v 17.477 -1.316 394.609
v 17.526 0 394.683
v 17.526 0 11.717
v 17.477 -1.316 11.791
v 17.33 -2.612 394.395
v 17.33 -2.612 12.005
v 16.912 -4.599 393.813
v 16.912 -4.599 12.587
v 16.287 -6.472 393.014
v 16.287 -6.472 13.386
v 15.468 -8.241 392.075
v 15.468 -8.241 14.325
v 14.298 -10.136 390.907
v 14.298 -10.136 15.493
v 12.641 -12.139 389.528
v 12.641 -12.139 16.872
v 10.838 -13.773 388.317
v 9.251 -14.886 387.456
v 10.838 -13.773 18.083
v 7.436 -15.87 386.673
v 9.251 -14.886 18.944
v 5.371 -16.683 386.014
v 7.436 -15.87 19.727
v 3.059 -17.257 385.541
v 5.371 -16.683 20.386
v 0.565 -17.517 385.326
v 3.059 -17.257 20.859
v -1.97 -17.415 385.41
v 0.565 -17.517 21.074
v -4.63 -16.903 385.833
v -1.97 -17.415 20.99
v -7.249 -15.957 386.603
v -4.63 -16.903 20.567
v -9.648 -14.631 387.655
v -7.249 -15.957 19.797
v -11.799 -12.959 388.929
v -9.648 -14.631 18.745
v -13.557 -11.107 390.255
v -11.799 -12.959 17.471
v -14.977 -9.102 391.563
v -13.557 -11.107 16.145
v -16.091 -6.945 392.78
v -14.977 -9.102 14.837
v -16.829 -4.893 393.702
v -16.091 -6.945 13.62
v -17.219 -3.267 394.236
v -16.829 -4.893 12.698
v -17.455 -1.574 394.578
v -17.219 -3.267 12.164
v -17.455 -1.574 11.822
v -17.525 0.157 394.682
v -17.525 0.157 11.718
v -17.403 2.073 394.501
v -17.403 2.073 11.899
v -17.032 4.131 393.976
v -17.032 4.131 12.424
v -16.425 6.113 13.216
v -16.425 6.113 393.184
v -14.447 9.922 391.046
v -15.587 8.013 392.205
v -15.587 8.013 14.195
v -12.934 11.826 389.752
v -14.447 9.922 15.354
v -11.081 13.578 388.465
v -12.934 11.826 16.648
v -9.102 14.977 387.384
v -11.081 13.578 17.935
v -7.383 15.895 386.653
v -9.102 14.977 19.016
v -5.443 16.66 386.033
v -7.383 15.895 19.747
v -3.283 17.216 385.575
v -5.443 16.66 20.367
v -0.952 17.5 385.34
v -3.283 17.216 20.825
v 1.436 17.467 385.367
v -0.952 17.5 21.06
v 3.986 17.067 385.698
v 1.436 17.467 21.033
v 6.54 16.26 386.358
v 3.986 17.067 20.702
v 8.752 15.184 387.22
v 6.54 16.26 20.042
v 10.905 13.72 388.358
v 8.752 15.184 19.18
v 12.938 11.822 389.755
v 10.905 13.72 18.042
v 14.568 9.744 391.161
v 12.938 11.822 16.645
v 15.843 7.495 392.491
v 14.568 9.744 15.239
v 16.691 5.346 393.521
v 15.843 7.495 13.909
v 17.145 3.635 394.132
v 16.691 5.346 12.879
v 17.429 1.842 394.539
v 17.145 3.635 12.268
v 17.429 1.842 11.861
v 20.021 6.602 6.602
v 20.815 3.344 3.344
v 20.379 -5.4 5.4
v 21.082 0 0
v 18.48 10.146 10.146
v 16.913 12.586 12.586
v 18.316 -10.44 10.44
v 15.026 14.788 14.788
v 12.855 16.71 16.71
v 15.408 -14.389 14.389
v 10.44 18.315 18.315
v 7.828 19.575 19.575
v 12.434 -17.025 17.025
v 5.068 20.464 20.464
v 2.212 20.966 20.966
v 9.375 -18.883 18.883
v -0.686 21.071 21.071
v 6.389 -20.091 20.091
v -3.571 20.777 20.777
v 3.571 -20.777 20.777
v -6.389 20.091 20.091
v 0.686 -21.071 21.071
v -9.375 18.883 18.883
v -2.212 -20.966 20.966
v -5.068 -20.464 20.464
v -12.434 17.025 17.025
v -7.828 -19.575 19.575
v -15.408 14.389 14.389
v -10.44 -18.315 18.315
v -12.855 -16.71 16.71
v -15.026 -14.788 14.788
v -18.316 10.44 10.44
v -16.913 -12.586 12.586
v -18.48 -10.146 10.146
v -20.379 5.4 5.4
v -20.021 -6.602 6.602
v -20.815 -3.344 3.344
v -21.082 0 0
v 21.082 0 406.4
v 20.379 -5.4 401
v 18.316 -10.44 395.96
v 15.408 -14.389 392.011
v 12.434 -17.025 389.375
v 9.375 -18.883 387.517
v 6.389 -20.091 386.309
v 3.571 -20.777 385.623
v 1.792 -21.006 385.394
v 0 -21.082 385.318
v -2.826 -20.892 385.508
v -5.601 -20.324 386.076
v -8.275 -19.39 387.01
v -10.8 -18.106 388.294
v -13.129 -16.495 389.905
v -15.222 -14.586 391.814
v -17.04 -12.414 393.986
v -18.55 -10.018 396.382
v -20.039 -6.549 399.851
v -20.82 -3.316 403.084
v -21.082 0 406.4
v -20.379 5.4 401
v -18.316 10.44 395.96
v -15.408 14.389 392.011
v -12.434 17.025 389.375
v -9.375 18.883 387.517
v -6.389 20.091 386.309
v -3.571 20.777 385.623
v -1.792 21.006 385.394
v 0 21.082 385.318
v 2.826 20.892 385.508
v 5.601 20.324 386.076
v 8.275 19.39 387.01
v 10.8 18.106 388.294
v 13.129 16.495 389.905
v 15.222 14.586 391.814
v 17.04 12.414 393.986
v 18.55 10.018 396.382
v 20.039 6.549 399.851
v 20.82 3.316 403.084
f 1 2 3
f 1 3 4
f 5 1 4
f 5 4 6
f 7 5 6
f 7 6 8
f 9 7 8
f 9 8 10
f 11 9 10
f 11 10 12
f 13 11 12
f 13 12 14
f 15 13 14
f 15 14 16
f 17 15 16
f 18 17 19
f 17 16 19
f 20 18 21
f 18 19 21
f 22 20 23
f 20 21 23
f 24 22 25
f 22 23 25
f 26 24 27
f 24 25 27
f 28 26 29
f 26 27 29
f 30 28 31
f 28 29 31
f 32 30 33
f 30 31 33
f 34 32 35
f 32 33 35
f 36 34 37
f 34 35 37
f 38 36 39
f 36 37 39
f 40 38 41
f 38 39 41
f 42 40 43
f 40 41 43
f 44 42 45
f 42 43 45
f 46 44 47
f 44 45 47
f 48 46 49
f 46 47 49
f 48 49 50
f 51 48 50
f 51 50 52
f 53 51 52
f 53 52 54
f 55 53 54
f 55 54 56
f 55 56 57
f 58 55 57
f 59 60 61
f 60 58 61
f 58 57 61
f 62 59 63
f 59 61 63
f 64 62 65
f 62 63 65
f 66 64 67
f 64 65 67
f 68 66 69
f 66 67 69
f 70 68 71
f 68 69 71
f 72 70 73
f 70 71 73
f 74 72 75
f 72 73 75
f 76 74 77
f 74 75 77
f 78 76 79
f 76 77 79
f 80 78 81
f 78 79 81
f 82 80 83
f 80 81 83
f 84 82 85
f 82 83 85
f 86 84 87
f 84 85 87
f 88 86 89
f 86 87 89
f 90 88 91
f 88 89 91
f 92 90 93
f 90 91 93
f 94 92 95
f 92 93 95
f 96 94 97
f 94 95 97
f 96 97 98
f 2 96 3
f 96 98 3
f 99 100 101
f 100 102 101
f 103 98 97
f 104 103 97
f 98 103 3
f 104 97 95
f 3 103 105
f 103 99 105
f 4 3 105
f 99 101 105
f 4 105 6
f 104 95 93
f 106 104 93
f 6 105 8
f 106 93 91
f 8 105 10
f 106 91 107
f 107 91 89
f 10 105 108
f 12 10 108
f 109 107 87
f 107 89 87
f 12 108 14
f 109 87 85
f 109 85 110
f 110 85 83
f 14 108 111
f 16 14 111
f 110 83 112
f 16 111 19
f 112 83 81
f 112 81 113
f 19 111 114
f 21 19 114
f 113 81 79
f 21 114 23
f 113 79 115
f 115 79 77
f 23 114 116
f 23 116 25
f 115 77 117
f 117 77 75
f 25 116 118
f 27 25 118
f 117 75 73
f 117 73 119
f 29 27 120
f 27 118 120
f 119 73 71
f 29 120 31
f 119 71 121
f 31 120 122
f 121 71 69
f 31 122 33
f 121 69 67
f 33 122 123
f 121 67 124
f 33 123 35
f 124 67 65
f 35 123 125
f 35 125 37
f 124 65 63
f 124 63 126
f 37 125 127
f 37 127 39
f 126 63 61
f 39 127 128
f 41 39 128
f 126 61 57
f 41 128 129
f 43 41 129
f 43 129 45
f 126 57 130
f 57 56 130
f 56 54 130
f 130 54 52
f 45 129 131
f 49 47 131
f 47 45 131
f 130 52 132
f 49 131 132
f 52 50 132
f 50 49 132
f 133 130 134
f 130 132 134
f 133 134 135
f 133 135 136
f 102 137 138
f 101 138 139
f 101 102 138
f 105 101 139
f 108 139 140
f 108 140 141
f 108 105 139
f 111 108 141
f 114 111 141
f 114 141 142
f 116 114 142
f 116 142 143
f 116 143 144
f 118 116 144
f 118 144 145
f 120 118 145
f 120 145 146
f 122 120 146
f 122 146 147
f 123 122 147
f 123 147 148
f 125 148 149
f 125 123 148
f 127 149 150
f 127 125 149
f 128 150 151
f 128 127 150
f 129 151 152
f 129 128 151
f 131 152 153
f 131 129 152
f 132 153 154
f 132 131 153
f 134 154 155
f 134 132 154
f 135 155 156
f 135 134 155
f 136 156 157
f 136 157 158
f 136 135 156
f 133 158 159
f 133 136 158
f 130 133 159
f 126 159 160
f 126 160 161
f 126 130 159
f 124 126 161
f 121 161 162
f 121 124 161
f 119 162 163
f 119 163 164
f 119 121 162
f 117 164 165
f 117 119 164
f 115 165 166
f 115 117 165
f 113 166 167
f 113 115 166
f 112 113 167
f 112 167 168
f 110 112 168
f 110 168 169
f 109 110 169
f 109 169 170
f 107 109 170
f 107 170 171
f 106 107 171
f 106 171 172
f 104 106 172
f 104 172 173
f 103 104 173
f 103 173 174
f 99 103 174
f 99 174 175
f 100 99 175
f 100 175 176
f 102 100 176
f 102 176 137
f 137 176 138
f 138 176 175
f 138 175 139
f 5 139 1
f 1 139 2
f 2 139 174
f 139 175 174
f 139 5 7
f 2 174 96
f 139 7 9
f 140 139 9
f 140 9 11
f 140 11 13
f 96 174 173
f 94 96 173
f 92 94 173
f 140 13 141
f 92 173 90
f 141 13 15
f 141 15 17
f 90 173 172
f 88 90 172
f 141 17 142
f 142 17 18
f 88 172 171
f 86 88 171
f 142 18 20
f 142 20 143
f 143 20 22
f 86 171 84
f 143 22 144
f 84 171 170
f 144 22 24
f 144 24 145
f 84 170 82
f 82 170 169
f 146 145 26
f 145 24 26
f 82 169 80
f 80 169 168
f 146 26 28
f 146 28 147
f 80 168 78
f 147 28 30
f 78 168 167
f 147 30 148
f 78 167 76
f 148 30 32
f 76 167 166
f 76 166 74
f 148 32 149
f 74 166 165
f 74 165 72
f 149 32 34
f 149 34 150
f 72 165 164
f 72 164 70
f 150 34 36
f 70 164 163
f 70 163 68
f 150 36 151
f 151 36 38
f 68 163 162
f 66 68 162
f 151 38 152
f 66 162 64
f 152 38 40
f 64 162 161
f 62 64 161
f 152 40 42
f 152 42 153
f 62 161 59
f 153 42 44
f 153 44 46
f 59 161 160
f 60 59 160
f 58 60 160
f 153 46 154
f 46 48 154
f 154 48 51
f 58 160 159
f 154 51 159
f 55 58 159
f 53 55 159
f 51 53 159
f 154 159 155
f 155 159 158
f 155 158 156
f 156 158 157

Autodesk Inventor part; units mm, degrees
ref_plane "Start plane" through (0, 0, 0) normal (0, 0, 1) x (1, 0, 0)
ref_plane "End plane" through (0, 0, 406.4) normal (0, 0, 1) x (1, 0, 0)
sketch "Sketch" plane through (0, 0, 0) normal (0, 0, 1) x (1, 0, 0)
  circle A0 centre (0, 0) radius 17.526
  circle A1 centre (0, 0) radius 21.082
  dimension "d0" = 42.164
  dimension "d1" = 3.556
extrude "Body" add sketch "Sketch" along normal up to surface (406.4 mm away) from surface at 0
sketch "Sketch3" plane through (0, 0, 0) normal (0, 0, 1) x (1, 0, 0)
  line L0 (0, 0) -> (10, 0)
ref_plane "Work Plane3" through (0, 0, 0) normal (0, -1, 0) x (1, 0, 0)
sketch "Sketch4" plane through (0, 0, 0) normal (0, -1, 0) x (1, 0, 0)
  line L0 (-2, 0) -> (12, 0)
  line L1 (-2, 406.4) -> (12, 406.4)
  dimension "d7" = 406.4
ref_plane "Work Plane4" through (0, 254, 406.4) normal (0, -1, 0) x (1, 0, 0)
ref_plane "Work Plane5" through (0, -1473.2, 406.4) normal (0, -1, 0) x (1, 0, 0)
ref_plane "Work Plane6" through (0, -609.6, 406.4) normal (0, -1, 0) x (1, 0, 0)
sketch "Sketch5" plane through (0, -609.6, 406.4) normal (0, -1, 0) x (1, 0, 0)
  circle A0 centre (0, 0) radius 21.082
  circle A1 centre (0, 0) radius 17.526
extrude "Extrusion2" cut sketch "Sketch5" along normal up to surface (1727.2 mm away) from surface at -863.6 contours A0 | A1
ref_plane "Work Plane7" through (0, -1473.2, 0) normal (0, 1, 0) x (1, 0, 0)
ref_plane "Work Plane8" through (0, 254, 0) normal (0, 1, 0) x (1, 0, 0)
ref_plane "Work Plane9" through (0, -609.6, 0) normal (0, 1, 0) x (1, 0, 0)
sketch "Sketch6" plane through (0, -609.6, 0) normal (0, 1, 0) x (1, 0, 0)
  circle A0 centre (0, 0) radius 21.082
  circle A1 centre (0, 0) radius 17.526
extrude "Extrusion3" cut sketch "Sketch6" along normal up to surface (1727.2 mm away) from surface at -863.6 contours A0 | A1
equation "\"d0\" = G_H"
equation "\"d1\" = G_T"
equation "\"d2\" = G_L"
equation "\"G_H\" = 42.164"
equation "\"G_T\" = 3.556"
equation "\"G_L\" = d7"
equation "\"G_OFFSET_START\" = 0"
equation "\"G_OFFSET_END\" = 0"
equation "\"d5\" = G_OFFSET_END + B_L"
equation "\"B_L\" = 406.4"
properties part number "ANSI - 1 1/4 x 0.140 - 16" material "Aluminum 6061"
